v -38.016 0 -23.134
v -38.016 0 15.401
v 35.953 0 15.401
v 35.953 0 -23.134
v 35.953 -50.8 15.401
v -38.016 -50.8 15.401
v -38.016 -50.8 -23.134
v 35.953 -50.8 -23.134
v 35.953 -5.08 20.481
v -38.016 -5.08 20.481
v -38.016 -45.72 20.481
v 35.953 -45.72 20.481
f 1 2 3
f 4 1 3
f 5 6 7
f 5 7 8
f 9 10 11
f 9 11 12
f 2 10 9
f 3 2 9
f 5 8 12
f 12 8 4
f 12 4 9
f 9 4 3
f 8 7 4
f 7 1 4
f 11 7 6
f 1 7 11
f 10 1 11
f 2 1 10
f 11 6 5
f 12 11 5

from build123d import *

# Parameters (mm, degrees)
F0_W     = 73.9687271416
F0_H     = 43.6150282621
F1_DEPTH = 25.4
F2_DEPTH = 25.4
F3_SIZE  = 5.08
F4_SIZE  = 5.08


with BuildPart() as f1:
    # F0 (on Front) → F1 (new body)
    with BuildSketch(Plane.XZ):
        with Locations((-1.0314378887, -1.3261325657)):
            Rectangle(F0_W, F0_H)
    extrude(amount=F1_DEPTH)

    # F2 (add): a face of the model
    f2_faces = [f1.faces().sort_by_distance(p)[0] for p in [
        (-1.0314378887, -25.4, -1.3261325657),
    ]]
    extrude(f2_faces, amount=F2_DEPTH)

    # F3
    f3_edges = [f1.edges().sort_by_distance(p)[0] for p in [
        (-1.031438, 0, 20.481382),
    ]]
    chamfer(f3_edges, length=F3_SIZE)

    # F4
    f4_edges = [f1.edges().sort_by_distance(p)[0] for p in [
        (-1.031438, -50.8, 20.481382),
    ]]
    chamfer(f4_edges, length=F4_SIZE)


solid = f1.part
